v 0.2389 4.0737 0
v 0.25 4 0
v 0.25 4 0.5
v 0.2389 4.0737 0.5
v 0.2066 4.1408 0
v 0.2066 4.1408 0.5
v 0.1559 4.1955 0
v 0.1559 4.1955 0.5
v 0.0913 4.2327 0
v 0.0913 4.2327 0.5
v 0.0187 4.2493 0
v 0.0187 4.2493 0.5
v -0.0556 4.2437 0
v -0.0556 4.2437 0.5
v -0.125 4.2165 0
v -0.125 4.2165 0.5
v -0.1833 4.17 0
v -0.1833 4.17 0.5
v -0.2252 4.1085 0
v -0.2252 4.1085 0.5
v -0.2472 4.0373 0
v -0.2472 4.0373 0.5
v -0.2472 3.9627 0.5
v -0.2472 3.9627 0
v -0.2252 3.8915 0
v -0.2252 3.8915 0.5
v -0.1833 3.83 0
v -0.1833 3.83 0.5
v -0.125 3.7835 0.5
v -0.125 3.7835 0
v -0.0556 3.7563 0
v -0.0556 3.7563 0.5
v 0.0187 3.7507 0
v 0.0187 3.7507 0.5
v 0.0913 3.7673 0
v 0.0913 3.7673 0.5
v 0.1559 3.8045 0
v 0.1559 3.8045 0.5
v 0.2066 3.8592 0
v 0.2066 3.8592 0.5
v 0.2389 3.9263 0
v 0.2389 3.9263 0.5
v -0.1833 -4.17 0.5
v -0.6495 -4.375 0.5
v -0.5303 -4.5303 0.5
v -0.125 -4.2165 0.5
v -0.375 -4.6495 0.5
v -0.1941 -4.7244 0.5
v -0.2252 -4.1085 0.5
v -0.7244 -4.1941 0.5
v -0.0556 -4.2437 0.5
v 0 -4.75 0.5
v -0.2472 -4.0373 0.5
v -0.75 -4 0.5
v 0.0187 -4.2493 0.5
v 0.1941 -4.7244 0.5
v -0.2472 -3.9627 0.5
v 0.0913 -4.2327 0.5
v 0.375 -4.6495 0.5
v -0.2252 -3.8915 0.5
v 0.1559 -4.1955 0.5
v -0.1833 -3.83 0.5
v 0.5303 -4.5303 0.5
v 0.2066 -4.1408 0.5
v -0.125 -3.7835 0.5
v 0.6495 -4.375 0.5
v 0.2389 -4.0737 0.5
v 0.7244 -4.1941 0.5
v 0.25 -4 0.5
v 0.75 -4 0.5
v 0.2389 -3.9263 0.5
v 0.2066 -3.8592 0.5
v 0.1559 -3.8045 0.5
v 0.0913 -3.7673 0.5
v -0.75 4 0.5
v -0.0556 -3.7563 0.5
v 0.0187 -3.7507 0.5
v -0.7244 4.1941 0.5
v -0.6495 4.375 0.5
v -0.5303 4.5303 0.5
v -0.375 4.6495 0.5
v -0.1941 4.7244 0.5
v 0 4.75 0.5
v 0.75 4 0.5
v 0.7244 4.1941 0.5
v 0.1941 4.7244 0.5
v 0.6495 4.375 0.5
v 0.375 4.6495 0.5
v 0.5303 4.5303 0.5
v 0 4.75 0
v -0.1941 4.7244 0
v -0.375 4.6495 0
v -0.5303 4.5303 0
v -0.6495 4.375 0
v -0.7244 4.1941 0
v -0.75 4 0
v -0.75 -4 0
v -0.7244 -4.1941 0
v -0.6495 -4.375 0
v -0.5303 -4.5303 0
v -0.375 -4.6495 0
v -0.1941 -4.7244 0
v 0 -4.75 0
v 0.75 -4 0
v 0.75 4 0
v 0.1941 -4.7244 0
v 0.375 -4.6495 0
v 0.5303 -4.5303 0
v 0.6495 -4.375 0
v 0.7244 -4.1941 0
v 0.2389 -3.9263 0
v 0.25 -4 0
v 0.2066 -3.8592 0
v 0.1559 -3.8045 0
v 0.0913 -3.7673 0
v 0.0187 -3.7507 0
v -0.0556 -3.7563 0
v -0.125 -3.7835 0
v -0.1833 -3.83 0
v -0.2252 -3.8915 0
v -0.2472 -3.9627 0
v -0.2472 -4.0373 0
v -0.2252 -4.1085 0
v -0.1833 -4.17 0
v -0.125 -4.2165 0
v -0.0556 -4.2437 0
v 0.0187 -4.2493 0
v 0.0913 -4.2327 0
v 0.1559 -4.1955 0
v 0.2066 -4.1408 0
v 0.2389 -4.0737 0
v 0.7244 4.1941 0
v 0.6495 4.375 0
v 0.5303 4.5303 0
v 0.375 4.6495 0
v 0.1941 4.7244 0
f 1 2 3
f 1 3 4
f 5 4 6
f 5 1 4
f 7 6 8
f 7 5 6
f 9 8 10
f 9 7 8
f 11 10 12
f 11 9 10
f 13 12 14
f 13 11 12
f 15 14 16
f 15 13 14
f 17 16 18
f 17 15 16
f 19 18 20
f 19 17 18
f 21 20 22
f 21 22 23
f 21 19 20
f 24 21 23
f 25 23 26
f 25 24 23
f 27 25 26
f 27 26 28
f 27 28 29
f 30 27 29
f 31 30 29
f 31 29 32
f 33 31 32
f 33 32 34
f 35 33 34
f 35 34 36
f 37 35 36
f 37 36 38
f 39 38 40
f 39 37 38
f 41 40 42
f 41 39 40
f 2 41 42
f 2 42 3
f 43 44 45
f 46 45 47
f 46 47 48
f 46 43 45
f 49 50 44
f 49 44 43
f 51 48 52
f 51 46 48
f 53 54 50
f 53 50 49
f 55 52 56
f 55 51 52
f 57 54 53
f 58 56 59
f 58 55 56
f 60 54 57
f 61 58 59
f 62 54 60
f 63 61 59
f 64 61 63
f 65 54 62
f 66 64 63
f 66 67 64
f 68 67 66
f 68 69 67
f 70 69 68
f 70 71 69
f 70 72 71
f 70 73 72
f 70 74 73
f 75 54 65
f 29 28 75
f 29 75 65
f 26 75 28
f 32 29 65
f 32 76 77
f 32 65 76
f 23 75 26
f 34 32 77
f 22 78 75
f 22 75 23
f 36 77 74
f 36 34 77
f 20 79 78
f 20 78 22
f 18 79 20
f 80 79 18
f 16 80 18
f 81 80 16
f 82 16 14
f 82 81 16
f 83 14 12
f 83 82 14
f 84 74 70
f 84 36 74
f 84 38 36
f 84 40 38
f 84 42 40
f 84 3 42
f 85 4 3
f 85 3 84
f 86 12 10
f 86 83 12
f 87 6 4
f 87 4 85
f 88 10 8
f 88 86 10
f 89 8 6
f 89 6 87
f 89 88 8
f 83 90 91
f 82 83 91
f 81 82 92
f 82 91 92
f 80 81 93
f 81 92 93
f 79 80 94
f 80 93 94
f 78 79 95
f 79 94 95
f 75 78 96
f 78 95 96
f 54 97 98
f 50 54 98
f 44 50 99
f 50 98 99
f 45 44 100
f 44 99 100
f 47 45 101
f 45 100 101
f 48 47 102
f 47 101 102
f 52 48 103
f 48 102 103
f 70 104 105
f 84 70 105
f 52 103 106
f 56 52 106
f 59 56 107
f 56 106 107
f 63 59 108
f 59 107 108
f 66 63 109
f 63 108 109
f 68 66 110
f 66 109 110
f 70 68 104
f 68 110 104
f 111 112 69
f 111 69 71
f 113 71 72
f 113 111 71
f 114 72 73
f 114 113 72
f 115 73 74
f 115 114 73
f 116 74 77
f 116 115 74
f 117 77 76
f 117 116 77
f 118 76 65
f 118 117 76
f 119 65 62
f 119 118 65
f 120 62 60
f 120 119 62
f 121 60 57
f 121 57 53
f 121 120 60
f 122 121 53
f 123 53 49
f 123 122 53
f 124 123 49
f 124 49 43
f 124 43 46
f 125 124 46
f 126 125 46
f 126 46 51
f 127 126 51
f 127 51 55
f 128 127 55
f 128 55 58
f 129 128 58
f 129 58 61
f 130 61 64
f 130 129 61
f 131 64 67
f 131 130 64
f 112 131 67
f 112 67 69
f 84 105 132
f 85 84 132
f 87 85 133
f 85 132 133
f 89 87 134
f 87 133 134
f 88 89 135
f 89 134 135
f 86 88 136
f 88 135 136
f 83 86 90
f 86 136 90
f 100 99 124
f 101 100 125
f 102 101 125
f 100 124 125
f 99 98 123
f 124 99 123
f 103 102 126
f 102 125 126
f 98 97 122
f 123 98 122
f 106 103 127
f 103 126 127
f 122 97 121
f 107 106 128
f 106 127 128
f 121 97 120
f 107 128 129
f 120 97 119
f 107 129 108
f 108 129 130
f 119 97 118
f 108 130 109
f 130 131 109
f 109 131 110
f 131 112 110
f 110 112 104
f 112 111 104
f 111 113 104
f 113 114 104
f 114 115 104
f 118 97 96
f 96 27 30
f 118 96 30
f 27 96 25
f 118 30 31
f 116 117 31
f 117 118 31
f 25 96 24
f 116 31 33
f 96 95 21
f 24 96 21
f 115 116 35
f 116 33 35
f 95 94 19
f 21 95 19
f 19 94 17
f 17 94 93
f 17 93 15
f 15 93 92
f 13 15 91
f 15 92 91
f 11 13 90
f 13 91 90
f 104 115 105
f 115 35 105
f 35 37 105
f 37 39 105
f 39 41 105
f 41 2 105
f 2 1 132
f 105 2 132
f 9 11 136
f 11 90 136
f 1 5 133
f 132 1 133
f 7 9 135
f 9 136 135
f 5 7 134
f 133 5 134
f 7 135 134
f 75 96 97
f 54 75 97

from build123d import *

# Parameters (mm, degrees)
F0_R     = 0.25
F1_DEPTH = 0.5


with BuildPart() as f1:
    # F0 (on Top) → F1 (new body)
    with BuildSketch(Plane.XY):
        with BuildLine():
            Line((0.75, -4), (0.75, 4))
            ThreePointArc((0.75, 4), (0.53033, 4.53033), (0, 4.75))
            ThreePointArc((0, 4.75), (-0.53033, 4.53033), (-0.75, 4))
            Line((-0.75, 4), (-0.75, -4))
            ThreePointArc((-0.75, -4), (-0.53033, -4.53033), (0, -4.75))
            ThreePointArc((0, -4.75), (0.53033, -4.53033), (0.75, -4))
        make_face()
        with Locations((0, -4)):
            Circle(F0_R, mode=Mode.SUBTRACT)
        with Locations((0, 4)):
            Circle(F0_R, mode=Mode.SUBTRACT)
    extrude(amount=F1_DEPTH)


solid = f1.part
